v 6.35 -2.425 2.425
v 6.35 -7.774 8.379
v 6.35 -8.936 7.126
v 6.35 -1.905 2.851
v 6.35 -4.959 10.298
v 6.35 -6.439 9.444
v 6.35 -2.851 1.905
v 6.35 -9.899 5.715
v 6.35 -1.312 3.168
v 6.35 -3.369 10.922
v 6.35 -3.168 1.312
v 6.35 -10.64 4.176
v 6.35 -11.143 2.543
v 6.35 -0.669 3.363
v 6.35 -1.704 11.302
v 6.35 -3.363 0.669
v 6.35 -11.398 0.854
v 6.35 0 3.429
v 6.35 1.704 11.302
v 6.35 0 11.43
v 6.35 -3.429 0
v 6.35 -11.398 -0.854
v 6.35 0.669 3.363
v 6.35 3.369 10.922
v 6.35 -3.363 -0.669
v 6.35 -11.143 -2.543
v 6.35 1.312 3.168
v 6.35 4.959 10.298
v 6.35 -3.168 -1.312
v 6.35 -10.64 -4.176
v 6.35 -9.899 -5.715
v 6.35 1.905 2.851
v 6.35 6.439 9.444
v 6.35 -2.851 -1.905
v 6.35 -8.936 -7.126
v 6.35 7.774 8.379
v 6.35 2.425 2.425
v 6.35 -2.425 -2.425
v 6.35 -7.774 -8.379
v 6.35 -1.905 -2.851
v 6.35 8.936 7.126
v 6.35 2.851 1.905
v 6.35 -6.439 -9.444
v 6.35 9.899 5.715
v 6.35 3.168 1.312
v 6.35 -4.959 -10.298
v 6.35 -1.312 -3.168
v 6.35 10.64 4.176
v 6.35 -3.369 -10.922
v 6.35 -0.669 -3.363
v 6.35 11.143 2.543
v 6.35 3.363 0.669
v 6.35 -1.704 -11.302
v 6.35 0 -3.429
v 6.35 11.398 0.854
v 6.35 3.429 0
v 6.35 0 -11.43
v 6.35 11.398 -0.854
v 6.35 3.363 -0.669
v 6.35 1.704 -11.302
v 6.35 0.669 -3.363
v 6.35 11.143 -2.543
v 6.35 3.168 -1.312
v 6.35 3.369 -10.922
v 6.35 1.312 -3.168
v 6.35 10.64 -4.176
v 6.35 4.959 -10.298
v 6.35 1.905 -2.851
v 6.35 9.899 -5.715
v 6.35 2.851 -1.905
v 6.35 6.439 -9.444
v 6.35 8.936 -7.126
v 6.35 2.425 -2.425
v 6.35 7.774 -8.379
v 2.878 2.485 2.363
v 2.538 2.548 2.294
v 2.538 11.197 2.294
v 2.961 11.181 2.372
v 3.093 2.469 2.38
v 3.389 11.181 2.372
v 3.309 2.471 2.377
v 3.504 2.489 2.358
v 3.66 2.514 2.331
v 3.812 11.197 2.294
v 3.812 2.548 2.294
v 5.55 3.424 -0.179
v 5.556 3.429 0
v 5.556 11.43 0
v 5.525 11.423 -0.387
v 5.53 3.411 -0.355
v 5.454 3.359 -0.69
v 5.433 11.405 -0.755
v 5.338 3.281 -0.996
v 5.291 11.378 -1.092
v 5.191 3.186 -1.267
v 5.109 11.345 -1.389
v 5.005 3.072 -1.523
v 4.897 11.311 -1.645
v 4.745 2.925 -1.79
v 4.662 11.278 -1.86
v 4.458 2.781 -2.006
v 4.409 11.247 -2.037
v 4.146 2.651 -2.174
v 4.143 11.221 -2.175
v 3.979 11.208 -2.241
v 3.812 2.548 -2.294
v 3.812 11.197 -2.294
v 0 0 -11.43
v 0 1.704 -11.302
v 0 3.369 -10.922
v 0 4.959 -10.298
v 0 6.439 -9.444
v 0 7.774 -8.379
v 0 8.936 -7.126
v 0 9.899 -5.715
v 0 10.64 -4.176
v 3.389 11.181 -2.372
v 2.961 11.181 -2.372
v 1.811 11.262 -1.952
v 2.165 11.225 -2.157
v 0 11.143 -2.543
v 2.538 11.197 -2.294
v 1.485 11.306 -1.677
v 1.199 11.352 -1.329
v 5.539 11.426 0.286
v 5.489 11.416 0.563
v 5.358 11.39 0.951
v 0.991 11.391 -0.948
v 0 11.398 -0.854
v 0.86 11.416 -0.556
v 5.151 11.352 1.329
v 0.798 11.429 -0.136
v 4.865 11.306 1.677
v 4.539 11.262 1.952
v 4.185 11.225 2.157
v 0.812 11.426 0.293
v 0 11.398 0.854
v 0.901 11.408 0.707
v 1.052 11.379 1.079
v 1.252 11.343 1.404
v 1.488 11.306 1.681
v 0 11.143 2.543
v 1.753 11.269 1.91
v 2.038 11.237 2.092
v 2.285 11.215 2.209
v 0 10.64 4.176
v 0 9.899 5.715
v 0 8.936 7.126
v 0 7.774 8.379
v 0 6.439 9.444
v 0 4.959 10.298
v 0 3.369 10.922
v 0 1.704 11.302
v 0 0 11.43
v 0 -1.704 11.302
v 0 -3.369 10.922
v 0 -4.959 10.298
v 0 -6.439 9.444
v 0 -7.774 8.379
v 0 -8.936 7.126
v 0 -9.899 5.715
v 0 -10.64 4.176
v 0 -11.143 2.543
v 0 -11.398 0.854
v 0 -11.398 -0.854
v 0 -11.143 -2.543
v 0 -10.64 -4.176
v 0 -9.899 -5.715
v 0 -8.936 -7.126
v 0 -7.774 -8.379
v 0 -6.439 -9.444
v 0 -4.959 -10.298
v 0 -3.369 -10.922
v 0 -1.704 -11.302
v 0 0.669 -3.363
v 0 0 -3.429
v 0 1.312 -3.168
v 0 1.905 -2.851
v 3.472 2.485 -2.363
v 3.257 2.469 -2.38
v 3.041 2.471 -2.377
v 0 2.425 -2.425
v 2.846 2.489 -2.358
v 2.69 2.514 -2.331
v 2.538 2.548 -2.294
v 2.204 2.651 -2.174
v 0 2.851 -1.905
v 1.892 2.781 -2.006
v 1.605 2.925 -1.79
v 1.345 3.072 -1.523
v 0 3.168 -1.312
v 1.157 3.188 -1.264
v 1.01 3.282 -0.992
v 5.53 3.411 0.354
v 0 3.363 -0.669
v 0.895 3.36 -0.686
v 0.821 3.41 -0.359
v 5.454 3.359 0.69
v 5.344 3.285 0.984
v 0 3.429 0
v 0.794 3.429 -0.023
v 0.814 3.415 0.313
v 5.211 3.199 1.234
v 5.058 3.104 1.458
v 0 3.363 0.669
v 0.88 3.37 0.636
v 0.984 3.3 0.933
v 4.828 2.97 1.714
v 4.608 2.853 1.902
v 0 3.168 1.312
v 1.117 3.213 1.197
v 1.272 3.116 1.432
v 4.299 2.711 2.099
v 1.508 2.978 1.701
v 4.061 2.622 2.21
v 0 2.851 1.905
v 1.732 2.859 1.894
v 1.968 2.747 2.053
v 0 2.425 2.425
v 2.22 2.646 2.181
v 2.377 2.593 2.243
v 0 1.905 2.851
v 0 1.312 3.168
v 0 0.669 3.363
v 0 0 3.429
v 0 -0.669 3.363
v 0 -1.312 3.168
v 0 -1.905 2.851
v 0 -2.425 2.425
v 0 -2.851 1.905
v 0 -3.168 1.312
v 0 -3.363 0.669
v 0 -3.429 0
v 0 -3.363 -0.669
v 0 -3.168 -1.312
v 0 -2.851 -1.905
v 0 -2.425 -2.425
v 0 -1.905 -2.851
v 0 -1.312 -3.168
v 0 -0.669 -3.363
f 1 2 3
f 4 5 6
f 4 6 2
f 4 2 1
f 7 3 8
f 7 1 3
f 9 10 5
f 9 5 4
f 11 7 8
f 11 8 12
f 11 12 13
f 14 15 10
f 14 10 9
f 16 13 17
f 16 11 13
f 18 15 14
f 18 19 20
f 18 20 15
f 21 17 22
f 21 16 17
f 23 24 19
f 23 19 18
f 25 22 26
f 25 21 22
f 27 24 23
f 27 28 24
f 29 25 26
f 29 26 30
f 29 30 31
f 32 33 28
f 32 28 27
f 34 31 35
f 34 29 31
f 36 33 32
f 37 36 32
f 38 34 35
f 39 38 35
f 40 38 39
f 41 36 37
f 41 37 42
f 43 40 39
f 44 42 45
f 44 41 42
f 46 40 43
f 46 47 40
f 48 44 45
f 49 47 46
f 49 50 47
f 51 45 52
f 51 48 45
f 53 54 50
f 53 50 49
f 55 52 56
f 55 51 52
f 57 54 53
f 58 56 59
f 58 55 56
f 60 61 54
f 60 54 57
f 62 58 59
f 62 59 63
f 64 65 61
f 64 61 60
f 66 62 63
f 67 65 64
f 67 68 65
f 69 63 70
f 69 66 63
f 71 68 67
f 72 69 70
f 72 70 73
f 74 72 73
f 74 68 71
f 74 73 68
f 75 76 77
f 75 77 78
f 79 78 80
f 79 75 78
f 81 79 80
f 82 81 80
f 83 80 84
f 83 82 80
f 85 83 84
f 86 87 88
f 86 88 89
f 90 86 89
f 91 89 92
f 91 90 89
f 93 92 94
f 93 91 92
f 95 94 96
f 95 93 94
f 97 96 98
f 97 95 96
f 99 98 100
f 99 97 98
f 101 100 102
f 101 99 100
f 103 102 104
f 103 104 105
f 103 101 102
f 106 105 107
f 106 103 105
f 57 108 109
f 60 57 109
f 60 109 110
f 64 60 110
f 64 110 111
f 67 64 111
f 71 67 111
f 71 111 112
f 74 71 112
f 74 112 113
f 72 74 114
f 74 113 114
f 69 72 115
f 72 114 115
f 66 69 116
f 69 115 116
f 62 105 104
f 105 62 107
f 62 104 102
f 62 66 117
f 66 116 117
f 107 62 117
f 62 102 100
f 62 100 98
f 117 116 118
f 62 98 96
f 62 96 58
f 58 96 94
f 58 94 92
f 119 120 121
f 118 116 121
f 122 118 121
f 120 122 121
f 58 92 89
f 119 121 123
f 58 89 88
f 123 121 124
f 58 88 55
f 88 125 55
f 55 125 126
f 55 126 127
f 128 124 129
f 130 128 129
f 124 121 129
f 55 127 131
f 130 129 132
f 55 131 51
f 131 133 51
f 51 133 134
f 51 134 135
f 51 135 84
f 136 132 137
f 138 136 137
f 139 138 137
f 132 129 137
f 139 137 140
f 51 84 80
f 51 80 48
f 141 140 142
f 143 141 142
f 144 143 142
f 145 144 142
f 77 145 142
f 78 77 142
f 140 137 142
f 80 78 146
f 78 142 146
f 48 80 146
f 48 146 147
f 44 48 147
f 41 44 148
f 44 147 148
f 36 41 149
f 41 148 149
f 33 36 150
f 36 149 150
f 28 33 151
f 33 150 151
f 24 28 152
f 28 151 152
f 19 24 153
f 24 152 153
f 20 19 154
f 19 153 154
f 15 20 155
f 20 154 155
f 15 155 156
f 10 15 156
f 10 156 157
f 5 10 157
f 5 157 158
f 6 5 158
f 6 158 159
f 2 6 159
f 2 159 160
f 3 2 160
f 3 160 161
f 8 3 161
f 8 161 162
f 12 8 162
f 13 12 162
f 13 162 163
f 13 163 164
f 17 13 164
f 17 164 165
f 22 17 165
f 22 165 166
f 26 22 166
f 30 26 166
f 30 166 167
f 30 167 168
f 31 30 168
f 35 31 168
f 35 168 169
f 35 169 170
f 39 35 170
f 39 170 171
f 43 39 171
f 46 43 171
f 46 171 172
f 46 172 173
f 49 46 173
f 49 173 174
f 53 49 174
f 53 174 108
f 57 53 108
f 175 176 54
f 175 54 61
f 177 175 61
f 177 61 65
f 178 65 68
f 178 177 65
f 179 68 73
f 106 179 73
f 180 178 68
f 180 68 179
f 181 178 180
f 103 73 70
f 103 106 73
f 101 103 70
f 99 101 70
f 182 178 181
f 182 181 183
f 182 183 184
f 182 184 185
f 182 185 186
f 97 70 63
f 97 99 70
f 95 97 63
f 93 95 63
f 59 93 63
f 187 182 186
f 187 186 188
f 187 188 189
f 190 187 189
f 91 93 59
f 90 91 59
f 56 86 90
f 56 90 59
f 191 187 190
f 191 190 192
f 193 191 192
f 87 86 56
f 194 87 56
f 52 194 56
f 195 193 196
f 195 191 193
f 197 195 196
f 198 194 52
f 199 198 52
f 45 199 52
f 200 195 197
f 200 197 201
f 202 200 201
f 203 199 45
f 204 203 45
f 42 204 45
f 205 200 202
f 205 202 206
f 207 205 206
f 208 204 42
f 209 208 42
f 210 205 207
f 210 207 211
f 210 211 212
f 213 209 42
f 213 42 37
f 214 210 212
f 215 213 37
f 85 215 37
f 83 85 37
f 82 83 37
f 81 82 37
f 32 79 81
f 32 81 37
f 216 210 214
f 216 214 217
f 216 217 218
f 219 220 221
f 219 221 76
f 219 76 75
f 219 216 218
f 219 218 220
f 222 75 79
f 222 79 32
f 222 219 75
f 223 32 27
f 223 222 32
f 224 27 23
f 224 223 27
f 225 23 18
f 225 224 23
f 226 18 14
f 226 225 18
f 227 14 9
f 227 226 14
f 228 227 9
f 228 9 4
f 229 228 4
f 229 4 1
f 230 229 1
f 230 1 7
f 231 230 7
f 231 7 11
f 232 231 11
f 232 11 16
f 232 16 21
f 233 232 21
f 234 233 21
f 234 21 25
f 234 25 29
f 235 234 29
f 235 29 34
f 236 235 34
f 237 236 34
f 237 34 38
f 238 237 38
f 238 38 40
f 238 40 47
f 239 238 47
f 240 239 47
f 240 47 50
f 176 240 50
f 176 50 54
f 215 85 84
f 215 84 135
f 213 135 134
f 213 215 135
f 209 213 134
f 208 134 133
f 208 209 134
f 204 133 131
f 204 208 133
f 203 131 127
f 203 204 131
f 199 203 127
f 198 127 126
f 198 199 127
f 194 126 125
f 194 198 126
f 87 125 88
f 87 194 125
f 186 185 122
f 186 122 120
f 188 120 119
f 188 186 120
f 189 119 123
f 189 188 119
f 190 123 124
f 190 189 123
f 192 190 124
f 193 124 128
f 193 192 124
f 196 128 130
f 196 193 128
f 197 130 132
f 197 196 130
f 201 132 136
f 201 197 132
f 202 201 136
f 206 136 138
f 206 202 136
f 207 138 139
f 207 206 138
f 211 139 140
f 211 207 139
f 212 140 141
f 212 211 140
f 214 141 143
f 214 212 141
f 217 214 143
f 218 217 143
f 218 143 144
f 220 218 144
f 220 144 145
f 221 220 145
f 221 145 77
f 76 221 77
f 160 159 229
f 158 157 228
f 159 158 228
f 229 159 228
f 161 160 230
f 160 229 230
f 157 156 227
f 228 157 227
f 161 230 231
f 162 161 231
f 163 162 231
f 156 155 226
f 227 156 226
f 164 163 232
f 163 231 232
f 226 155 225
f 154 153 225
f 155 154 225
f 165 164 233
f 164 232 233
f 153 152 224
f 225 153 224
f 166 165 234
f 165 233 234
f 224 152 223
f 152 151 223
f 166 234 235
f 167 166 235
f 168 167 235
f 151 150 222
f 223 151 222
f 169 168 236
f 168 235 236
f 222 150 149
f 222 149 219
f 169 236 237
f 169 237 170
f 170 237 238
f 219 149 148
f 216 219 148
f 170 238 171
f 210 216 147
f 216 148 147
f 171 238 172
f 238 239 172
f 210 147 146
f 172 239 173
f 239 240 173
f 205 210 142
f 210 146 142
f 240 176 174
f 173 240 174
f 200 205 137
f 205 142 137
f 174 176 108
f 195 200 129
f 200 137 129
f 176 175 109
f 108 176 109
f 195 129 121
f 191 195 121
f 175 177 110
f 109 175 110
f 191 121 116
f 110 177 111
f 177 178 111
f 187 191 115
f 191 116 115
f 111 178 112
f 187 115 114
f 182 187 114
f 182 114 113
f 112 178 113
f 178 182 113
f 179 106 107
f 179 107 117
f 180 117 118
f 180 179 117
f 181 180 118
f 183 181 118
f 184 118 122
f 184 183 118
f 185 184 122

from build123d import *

# Parameters (mm, degrees)
SKETCH1_R           = 11.43
SKETCH1_R_2         = 3.429
BOSS_EXTRUDE1_DEPTH = 6.35
CUT_EXTRUDE1_DEPTH  = 14.986


with BuildPart() as part:
    # Sketch1 → Boss-Extrude1 (new body)
    with BuildSketch(Plane(origin=(0, 0, 0), x_dir=(0, 0, -1), z_dir=(1, 0, 0))):
        Circle(SKETCH1_R)
        Circle(SKETCH1_R_2, mode=Mode.SUBTRACT)
    extrude(amount=BOSS_EXTRUDE1_DEPTH)

    # Sketch2 → Cut-Extrude1 (cut)
    with BuildSketch(Plane(origin=(0, 0, 0), x_dir=(1, 0, 0), z_dir=(0, 1, 0))):
        with BuildLine():
            ThreePointArc((5.55625, 0), (5.070783, 1.440957453), (3.812326951, 2.294377022))
            Line((3.812326951, 2.294377022), (3.175, 0))
            Line((3.175, 0), (3.812326951, -2.294377022))
            ThreePointArc((3.812326951, -2.294377022), (5.070783, -1.440957453), (5.55625, 0))
        make_face()
        with BuildLine():
            Line((3.175, 0), (3.812326951, 2.294377022))
            ThreePointArc((3.812326951, 2.294377022), (3.175, 2.38125), (2.537673049, 2.294377022))
            Line((2.537673049, 2.294377022), (3.175, 0))
        make_face()
        with BuildLine():
            Line((3.812326951, -2.294377022), (3.175, 0))
            Line((3.175, 0), (2.537673049, -2.294377022))
            ThreePointArc((2.537673049, -2.294377022), (3.175, -2.38125), (3.812326951, -2.294377022))
        make_face()
        with BuildLine():
            Line((2.537673049, -2.294377022), (3.175, 0))
            Line((3.175, 0), (2.537673049, 2.294377022))
            ThreePointArc((2.537673049, 2.294377022), (0.79375, 0), (2.537673049, -2.294377022))
        make_face()
    extrude(amount=CUT_EXTRUDE1_DEPTH, mode=Mode.SUBTRACT)


solid = part.part
